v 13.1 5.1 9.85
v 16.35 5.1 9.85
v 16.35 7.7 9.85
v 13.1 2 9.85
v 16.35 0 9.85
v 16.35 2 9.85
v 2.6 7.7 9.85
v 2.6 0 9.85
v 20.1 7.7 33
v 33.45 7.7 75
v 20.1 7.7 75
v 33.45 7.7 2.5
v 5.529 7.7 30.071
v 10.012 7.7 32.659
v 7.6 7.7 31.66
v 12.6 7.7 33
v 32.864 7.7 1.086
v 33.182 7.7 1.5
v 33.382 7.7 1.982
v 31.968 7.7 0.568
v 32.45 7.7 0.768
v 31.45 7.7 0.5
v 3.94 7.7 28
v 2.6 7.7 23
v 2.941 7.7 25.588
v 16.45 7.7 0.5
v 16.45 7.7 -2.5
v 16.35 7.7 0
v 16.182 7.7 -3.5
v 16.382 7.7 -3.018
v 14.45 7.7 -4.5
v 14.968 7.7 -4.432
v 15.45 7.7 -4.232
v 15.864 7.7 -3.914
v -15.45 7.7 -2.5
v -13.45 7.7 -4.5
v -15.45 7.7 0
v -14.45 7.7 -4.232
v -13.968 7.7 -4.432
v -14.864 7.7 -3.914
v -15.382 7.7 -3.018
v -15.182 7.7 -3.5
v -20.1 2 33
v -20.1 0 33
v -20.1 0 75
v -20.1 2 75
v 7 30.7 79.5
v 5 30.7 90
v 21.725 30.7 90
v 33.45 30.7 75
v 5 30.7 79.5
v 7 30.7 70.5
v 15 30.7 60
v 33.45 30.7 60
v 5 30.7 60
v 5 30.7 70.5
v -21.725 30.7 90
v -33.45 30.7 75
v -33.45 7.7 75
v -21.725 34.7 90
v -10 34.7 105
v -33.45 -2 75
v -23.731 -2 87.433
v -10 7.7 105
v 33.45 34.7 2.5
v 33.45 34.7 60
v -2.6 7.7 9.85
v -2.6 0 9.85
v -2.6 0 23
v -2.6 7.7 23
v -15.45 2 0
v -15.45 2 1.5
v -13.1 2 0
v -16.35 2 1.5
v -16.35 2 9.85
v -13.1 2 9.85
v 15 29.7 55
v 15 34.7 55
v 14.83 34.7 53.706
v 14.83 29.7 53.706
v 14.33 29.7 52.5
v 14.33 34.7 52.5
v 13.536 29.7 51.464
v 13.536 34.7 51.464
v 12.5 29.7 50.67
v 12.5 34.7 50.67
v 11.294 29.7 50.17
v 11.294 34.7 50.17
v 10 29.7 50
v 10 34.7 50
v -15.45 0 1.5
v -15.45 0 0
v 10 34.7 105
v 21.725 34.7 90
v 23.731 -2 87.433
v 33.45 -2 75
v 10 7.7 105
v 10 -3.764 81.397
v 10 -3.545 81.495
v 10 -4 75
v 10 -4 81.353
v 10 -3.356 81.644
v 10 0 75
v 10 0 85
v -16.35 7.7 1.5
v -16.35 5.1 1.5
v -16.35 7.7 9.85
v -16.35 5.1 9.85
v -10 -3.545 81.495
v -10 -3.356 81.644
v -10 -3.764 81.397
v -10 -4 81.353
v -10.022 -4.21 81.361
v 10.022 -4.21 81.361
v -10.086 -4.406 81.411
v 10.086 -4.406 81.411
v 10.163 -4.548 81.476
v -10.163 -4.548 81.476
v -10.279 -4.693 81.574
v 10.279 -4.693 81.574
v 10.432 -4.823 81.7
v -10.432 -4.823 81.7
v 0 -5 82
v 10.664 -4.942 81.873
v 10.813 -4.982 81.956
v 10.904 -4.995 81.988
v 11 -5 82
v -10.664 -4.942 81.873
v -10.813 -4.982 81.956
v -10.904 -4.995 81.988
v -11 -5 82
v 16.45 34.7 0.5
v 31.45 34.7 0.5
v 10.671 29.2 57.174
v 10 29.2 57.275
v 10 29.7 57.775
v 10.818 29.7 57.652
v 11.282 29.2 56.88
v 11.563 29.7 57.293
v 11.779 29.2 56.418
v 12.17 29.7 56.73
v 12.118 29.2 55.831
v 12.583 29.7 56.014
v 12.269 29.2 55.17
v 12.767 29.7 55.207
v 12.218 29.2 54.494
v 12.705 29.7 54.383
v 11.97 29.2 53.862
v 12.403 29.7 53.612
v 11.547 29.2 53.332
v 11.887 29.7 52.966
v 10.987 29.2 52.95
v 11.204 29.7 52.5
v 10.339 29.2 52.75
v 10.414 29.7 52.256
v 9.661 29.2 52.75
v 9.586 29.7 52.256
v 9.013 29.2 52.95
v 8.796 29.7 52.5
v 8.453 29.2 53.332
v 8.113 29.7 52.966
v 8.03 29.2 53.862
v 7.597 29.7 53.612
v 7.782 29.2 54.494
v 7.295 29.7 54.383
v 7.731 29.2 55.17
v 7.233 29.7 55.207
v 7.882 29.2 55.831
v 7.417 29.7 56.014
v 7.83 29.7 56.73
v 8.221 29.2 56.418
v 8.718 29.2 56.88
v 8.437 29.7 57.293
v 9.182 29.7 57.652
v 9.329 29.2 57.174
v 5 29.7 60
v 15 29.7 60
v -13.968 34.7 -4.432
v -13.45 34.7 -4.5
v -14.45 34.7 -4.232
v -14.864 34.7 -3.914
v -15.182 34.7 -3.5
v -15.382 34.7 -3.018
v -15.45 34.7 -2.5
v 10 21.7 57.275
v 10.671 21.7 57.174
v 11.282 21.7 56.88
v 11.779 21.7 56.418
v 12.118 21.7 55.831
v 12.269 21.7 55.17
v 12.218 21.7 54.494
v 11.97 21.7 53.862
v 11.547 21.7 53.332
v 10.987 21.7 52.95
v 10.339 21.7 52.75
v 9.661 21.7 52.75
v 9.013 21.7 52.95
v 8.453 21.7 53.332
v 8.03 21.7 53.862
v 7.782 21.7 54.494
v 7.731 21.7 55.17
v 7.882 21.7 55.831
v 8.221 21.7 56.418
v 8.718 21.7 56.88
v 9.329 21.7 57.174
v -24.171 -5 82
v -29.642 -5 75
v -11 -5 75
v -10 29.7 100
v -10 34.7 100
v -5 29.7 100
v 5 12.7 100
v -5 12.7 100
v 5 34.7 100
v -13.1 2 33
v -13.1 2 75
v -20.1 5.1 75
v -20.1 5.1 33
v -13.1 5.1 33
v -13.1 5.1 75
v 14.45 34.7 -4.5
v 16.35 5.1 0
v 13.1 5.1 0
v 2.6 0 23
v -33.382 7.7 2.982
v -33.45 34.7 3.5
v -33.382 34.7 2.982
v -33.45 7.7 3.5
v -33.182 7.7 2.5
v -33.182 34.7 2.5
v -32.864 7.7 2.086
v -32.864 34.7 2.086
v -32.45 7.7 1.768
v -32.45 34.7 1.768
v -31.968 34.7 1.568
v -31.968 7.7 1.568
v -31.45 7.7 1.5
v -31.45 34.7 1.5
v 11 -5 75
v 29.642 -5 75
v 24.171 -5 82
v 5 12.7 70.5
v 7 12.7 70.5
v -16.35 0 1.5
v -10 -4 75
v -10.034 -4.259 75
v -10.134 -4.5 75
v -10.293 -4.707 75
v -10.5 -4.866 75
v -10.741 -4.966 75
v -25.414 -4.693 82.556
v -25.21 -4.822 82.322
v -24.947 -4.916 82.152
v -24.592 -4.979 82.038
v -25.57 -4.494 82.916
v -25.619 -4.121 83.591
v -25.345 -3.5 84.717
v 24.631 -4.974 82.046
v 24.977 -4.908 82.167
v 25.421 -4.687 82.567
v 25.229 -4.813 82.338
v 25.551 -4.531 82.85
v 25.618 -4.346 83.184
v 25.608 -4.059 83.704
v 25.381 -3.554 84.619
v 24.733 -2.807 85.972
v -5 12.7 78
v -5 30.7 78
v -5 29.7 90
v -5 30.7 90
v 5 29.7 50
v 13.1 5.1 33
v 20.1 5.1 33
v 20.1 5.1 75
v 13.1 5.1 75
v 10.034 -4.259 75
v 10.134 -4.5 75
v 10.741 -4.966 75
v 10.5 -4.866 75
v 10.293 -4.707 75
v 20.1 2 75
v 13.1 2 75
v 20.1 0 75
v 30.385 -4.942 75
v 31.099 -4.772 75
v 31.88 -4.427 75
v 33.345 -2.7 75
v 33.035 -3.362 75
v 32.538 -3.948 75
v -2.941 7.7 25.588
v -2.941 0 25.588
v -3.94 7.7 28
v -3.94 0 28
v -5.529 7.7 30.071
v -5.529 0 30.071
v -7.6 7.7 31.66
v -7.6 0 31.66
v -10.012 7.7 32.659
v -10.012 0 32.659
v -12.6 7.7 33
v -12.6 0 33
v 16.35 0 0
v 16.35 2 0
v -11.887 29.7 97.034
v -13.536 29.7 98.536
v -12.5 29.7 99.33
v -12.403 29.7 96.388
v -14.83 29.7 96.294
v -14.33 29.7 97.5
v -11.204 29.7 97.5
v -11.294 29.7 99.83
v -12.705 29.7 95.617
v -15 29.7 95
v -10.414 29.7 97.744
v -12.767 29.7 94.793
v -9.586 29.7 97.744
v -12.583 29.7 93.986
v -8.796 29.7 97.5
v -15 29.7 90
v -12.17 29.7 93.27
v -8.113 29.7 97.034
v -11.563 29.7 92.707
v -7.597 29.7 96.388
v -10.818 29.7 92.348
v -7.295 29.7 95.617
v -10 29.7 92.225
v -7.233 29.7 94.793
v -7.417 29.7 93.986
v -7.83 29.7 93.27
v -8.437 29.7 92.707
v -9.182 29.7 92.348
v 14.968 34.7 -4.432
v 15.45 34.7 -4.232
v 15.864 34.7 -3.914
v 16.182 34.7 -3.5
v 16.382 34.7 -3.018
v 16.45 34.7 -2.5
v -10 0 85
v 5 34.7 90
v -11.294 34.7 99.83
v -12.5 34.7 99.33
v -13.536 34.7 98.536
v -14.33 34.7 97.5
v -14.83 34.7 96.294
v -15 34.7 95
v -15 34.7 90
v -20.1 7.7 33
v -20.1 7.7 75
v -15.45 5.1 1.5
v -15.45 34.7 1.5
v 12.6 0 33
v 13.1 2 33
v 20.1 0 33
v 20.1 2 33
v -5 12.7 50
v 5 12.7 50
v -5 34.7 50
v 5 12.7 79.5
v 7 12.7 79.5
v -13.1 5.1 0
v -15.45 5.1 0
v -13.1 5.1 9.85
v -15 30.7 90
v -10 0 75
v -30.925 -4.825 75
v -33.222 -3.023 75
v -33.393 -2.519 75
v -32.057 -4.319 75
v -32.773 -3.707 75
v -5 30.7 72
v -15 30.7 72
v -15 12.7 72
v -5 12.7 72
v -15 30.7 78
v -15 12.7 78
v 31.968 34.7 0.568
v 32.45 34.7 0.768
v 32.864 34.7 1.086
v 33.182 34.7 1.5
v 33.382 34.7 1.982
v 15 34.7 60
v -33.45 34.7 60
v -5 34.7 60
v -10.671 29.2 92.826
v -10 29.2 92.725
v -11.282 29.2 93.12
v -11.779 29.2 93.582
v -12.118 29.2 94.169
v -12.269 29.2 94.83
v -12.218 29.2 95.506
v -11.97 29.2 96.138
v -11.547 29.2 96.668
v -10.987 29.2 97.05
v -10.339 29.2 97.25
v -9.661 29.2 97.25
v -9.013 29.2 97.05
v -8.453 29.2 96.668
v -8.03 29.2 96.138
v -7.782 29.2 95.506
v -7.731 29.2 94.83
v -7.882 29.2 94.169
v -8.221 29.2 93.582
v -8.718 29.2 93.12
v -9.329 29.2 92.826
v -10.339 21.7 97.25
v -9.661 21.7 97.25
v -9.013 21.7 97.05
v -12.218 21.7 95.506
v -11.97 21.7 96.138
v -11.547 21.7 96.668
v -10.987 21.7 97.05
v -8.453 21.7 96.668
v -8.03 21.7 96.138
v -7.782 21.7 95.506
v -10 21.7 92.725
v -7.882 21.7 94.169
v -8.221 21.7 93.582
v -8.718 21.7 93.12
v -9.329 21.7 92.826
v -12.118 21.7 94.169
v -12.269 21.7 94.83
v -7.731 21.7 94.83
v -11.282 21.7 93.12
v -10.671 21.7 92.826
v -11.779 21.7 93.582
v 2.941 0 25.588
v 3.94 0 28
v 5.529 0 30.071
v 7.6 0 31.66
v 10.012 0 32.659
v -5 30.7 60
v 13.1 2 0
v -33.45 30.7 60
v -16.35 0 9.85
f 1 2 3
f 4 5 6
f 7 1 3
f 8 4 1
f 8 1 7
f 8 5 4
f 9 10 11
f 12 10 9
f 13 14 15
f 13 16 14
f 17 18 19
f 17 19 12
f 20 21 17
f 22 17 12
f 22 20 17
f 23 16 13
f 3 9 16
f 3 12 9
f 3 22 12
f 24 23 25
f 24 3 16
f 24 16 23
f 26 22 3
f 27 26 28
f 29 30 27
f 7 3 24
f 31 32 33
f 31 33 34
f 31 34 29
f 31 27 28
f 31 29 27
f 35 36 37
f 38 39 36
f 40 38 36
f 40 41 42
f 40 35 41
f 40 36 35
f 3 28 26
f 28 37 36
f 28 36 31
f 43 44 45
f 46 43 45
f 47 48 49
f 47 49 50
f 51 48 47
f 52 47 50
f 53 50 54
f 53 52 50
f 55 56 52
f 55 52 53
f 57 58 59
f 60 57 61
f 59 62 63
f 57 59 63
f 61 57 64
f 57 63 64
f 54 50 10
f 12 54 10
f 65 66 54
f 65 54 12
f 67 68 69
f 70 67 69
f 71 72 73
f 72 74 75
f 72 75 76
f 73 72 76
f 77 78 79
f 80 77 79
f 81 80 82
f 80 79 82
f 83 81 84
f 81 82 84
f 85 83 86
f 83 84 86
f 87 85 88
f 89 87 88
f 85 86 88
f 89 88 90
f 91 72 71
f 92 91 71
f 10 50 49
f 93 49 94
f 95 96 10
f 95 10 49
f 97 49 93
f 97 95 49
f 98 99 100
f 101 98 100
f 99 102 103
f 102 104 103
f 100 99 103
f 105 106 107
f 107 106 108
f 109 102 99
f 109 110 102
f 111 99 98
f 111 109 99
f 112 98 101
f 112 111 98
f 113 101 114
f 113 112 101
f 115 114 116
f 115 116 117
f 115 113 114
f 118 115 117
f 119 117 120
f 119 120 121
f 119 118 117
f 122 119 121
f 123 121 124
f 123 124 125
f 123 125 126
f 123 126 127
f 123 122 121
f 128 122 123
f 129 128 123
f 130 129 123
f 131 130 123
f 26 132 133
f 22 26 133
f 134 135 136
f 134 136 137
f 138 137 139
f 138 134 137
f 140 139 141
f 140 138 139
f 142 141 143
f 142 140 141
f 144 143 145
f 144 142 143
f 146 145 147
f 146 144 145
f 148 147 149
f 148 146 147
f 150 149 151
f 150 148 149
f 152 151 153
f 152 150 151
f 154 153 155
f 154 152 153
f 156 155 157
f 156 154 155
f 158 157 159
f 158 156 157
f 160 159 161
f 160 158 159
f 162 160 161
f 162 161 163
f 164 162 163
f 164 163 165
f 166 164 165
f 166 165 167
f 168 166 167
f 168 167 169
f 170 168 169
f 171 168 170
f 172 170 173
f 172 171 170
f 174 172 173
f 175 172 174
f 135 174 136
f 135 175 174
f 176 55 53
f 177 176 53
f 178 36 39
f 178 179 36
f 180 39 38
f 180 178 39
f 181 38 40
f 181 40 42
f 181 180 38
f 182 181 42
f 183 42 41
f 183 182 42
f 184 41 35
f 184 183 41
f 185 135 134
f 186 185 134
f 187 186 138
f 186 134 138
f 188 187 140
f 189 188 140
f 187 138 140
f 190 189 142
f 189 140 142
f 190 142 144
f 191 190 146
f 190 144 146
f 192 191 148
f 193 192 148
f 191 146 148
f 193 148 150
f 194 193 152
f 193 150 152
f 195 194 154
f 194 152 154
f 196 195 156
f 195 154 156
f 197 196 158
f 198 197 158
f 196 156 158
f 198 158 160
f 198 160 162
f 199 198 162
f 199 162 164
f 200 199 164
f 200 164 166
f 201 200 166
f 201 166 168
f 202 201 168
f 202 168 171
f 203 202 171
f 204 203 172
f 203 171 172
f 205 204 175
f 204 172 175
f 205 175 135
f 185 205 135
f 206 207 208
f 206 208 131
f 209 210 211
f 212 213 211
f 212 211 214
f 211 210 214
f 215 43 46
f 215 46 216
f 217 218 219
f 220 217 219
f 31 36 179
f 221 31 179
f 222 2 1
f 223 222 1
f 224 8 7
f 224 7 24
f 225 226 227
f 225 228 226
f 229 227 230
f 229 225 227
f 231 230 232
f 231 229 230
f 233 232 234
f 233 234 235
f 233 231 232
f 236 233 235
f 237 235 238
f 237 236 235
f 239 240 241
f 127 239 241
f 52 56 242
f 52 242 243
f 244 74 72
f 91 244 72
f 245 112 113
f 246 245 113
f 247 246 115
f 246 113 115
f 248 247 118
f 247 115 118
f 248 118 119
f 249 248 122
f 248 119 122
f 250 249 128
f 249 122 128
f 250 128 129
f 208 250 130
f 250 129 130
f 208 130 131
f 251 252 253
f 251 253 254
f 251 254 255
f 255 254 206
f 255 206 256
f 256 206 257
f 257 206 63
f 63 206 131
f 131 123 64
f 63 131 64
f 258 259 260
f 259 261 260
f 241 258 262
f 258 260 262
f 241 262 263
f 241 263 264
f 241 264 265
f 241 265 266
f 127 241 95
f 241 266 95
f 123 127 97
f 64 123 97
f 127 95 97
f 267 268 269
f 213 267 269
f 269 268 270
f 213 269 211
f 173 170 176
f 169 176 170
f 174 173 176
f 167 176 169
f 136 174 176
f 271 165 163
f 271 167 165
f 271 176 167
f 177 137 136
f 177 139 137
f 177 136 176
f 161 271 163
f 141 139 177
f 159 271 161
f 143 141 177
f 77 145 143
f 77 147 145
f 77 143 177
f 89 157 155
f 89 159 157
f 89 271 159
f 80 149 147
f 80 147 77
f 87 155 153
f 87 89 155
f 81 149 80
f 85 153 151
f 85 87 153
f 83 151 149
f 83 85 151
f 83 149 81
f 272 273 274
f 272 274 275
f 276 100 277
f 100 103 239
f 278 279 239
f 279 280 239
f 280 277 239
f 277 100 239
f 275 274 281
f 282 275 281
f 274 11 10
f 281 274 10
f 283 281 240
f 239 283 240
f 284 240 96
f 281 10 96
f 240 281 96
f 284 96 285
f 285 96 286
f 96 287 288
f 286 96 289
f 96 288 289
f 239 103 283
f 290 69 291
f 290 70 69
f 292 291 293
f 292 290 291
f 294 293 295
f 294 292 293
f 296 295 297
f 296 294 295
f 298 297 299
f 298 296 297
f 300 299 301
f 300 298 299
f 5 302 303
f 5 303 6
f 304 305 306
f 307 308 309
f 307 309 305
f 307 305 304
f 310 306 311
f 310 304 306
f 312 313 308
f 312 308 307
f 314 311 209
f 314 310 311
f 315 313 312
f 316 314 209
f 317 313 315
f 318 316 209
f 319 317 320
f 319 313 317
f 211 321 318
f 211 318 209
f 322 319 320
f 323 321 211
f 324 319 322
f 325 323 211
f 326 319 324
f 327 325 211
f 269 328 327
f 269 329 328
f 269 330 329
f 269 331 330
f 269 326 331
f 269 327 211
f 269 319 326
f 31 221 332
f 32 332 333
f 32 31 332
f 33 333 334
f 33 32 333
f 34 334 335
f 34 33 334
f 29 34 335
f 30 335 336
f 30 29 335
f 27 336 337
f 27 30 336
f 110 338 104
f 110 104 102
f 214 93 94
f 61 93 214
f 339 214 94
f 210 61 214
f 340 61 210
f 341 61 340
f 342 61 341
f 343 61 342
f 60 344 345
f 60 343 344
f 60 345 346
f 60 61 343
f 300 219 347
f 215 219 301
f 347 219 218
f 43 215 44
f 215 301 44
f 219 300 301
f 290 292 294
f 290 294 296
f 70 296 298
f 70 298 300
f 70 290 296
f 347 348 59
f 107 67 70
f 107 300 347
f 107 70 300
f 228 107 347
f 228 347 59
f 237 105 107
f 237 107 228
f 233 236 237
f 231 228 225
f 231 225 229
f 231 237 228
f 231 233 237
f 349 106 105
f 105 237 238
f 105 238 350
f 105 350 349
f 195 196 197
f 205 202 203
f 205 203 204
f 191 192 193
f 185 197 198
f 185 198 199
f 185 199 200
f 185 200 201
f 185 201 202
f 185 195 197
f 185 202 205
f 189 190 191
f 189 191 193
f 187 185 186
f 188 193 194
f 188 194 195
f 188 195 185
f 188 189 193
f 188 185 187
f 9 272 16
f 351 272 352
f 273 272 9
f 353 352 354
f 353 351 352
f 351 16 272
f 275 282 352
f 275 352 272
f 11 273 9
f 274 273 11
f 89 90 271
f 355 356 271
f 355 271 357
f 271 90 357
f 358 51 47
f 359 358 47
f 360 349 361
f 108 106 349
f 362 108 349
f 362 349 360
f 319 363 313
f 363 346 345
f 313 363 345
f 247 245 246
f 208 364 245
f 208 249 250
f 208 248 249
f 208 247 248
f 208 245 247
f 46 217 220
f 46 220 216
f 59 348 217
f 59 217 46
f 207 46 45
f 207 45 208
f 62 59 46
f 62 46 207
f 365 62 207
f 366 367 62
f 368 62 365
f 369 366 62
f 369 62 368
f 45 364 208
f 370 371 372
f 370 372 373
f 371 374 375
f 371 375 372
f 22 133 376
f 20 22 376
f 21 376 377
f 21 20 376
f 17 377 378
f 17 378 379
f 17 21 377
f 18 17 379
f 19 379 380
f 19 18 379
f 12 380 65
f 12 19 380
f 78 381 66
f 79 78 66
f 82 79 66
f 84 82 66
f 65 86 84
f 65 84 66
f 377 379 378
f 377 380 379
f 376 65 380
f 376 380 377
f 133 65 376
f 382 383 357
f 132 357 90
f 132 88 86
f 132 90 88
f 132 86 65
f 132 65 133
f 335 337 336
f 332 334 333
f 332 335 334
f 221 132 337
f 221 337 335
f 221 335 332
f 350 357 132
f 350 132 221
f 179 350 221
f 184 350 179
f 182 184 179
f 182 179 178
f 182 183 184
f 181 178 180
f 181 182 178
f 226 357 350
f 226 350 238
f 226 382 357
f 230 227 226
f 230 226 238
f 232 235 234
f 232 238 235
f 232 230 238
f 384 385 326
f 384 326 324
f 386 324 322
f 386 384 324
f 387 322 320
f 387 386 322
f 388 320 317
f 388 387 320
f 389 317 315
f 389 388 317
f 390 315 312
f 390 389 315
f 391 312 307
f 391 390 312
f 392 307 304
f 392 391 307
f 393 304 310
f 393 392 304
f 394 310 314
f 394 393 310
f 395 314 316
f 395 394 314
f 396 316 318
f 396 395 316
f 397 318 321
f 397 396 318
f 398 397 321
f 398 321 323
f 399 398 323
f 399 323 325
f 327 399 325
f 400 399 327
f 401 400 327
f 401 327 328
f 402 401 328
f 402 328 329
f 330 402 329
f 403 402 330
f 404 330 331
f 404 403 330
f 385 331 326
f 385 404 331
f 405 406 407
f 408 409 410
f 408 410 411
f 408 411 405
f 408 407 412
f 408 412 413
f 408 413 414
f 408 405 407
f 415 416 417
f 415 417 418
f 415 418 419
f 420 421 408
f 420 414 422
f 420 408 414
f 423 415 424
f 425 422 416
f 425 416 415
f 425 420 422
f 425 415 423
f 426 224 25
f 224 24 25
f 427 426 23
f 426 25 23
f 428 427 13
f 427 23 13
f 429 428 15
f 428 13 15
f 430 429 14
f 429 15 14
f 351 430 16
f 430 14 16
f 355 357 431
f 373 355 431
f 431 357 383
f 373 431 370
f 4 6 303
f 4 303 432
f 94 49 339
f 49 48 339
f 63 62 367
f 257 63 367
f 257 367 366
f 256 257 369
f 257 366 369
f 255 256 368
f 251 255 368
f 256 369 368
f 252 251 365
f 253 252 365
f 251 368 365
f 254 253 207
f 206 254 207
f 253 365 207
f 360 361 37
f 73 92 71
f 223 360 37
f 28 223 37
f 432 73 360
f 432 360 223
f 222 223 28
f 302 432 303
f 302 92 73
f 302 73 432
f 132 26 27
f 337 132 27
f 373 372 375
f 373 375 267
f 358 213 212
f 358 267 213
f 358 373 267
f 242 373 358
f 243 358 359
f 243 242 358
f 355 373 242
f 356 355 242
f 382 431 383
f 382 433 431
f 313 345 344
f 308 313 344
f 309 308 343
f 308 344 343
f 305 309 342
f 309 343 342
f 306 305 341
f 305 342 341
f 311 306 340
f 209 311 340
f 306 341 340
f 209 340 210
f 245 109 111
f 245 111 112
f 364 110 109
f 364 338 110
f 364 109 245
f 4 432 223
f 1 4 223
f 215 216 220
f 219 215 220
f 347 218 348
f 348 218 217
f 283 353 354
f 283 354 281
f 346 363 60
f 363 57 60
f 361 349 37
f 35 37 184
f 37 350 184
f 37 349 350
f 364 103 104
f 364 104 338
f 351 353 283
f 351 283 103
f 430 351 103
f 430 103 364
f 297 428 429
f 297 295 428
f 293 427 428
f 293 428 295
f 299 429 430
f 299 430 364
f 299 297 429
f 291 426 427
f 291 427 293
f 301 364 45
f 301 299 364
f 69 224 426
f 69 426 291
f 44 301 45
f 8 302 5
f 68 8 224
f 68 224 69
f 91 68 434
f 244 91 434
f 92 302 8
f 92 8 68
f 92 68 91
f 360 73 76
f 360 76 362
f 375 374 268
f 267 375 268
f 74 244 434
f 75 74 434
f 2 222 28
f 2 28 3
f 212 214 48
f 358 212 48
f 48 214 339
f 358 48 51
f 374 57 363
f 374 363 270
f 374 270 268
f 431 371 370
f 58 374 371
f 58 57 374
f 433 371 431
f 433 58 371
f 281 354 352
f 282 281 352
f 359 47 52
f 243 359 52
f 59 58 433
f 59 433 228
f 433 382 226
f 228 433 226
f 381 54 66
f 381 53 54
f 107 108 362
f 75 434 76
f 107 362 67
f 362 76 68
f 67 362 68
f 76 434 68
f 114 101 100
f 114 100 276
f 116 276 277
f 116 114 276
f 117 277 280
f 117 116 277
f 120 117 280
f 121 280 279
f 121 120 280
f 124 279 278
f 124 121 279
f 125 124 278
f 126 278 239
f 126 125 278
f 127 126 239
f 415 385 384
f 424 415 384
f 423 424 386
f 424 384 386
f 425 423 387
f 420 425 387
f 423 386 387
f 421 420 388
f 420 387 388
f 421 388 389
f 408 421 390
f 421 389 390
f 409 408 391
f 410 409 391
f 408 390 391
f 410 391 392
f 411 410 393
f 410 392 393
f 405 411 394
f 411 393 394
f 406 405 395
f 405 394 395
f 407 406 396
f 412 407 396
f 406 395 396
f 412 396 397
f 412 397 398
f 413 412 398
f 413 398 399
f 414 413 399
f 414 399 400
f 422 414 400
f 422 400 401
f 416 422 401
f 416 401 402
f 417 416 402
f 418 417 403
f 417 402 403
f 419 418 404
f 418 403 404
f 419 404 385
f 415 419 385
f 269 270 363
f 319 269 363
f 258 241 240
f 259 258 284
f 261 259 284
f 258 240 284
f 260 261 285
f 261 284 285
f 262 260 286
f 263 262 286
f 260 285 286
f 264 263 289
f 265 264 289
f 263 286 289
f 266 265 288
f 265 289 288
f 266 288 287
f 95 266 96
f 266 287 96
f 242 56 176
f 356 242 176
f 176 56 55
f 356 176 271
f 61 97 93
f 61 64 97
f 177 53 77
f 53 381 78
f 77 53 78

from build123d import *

# Parameters (mm, degrees)
BOSS_EXTRUDE1_DEPTH     = 7.7
SKETCH2_W               = 7
SKETCH2_H               = 3.1
CUT_EXTRUDE1_DEPTH      = 79.027559234
FILLET1_R               = 10
BOSS_EXTRUDE2_DEPTH     = 2
SKETCH4_W               = 109.5
SKETCH4_H               = 25
BOSS_EXTRUDE3_DEPTH     = 33.45
BOSS_EXTRUDE4_REACH     = 117.534
CUT_EXTRUDE2_DEPTH      = 114.458814113
CUT_EXTRUDE2_DEPTH_BACK = 114.458814113
CUT_EXTRUDE3_DEPTH      = 10
FILLET3_R               = 1
CUT_EXTRUDE5_REACH      = 117.534
SKETCH9_W               = 30
SKETCH9_H               = 4
FILLET5_R               = 3
CUT_EXTRUDE4_REACH      = 119.132
SKETCH8_W               = 17
SKETCH8_H               = 5
SKETCH8_W_2             = 19
SKETCH8_H_2             = 7
FILLET6_R               = 2
FILLET7_R               = 2
SKETCH11_W              = 10
SKETCH11_H              = 10
CUT_EXTRUDE6_DEPTH      = 22
CUT_EXTRUDE9_DEPTH      = 5
SKETCH12_R              = 2.275
CUT_EXTRUDE7_DEPTH      = 8
CHAMFER1_SIZE           = 0.5
SKETCH13_W              = 2
SKETCH13_H              = 9
SKETCH13_W_2            = 10
SKETCH13_H_2            = 6
CUT_EXTRUDE10_DEPTH     = 18


with BuildPart() as part:
    # Sketch1 → Boss-Extrude1 (new body)
    with BuildSketch(Plane(origin=(0, 0, 0), x_dir=(1, 0, 0), z_dir=(0, 1, 0))):
        Polygon((0, 0), (-16.35, 0), (-16.35, -9.85), (-2.6, -9.85), (-2.6, -33), (-20.1, -33), (-20.1, -75), (0, -75), align=None)
    extrude(amount=BOSS_EXTRUDE1_DEPTH)

    # Sketch2 → Cut-Extrude1 (cut, through all)
    with BuildSketch(Plane.XY.offset(75)):
        with Locations((-16.6, 3.55)):
            Rectangle(SKETCH2_W, SKETCH2_H)
    extrude(amount=-CUT_EXTRUDE1_DEPTH, mode=Mode.SUBTRACT)

    # Fillet1
    fillet1_edges = [part.edges().sort_by_distance(p)[0] for p in [
        (-2.6, 3.85, 33),
    ]]
    fillet(fillet1_edges, radius=FILLET1_R)

    # Sketch3 → Boss-Extrude2 (add)
    with BuildSketch(Plane(origin=(0, 7.7, 0), x_dir=(1, 0, 0), z_dir=(0, 1, 0))):
        Polygon((0, 4.5), (-33.45, 4.5), (-33.45, -75), (-10, -105), (0, -105), align=None)
    extrude(amount=BOSS_EXTRUDE2_DEPTH)

    # Sketch4 → Boss-Extrude3 (add)
    with BuildSketch(Plane(origin=(0, 0, 0), x_dir=(0, 0, -1), z_dir=(1, 0, 0))):
        with Locations((-50.25, 22.2)):
            Rectangle(SKETCH4_W, SKETCH4_H)
    extrude(amount=-BOSS_EXTRUDE3_DEPTH)

    # Boss-Extrude4: up to this face of the body (flat: up to its plane)
    boss_extrude4_end = Plane(part.part.faces().sort_by_distance((0, 18.36479202, 48.166489813))[0])
    # Sketch5 → Boss-Extrude4 (add, up to the picked face)
    with BuildSketch(Plane.ZY.offset(33.45), mode=Mode.PRIVATE) as boss_extrude4_sk1:
        Polygon((75, 7.7), (75, -5), (82, -5), (105, 7.7), align=None)
    boss_extrude4_tool1 = split(extrude(boss_extrude4_sk1.sketch, amount=-BOSS_EXTRUDE4_REACH, mode=Mode.PRIVATE), bisect_by=boss_extrude4_end, keep=Keep.BOTH, mode=Mode.PRIVATE)
    add(boss_extrude4_tool1.solids().sort_by(Axis((-33.45, 2.665766, 85.441441), (1, 0, 0)))[0])

    # Sketch6 → Cut-Extrude2 (cut, two sides: drawn at the far end of the back side and taken through both)
    with BuildSketch(Plane(origin=(0, 7.7, 0), x_dir=(1, 0, 0), z_dir=(0, 1, 0)).offset(-CUT_EXTRUDE2_DEPTH_BACK)):
        Polygon((-33.45, -75), (-10, -105), (-33.45, -105), align=None)
    extrude(amount=CUT_EXTRUDE2_DEPTH + CUT_EXTRUDE2_DEPTH_BACK, mode=Mode.SUBTRACT)

    # Sketch7 → Cut-Extrude3 (cut)
    with BuildSketch(Plane(origin=(0, 0, 0), x_dir=(0, 0, -1), z_dir=(1, 0, 0))):
        Polygon((-75, 0), (-85, 0), (-80, -5), (-75, -5), align=None)
    extrude(amount=-CUT_EXTRUDE3_DEPTH, mode=Mode.SUBTRACT)

    # Fillet3
    # the kernel refuses this fillet: 1 mm, written as the material it takes off along each edge
    with BuildSketch(Plane(origin=(5.810983209, -5, 80), x_dir=(0, 0.707106781186549, 0.7071067811865459), z_dir=(-1, 0, 0))) as fillet3_piece_1:
        with BuildLine():
            CenterArc((2.324393283, -1), FILLET3_R, 90, 114.469800521)
            Line((1.414213562, -1.414213562), (1.396009968, -1.422497834))
            ThreePointArc((1.396009968, -1.422497834), (0.692964646, -0.721248917), (-0.014142136, -0.014142136))
            Line((-0.014142136, -0.014142136), (0, 0.02))
            Line((0, 0.02), (2.324393283, 0.02))
            Line((2.324393283, 0.02), (2.324393283, 0))
        make_face()
    extrude(amount=15.810983209, mode=Mode.SUBTRACT)
    with BuildSketch(Plane(origin=(-10, -5, 82.5), x_dir=(0, 1, 0), z_dir=(0, 0, -1))) as fillet3_piece_2_section:
        with BuildLine():
            CenterArc((FILLET3_R, -FILLET3_R), FILLET3_R, 90, 90)
            Line((0, -FILLET3_R), (-FILLET3_R * 0.02, -FILLET3_R))
            Line((-FILLET3_R * 0.02, -FILLET3_R), (-FILLET3_R * 0.02, FILLET3_R * 0.02))
            Line((-FILLET3_R * 0.02, FILLET3_R * 0.02), (FILLET3_R, FILLET3_R * 0.02))
            Line((FILLET3_R, FILLET3_R * 0.02), (FILLET3_R, 0))
        make_face()
    fillet3_piece_2 = extrude(amount=10, mode=Mode.PRIVATE)
    fillet3_piece_2 = split(fillet3_piece_2, bisect_by=Plane(origin=(-10.222841489, -6.700692184, 78.299307816), z_dir=(0, 0.7071067811865466, -0.7071067811865485)), keep=Keep.TOP, mode=Mode.PRIVATE)
    add(fillet3_piece_2, mode=Mode.SUBTRACT)
    with BuildSketch(Plane(origin=(5.810983209, -5, 80), x_dir=(0, 0.707106781186549, 0.7071067811865459), z_dir=(-1, 0, 0))) as fillet3_piece_3a_section:
        with BuildLine():
            CenterArc((2.324393283, -1), FILLET3_R, 90, 114.469800521)
            Line((1.414213562, -1.414213562), (1.396009968, -1.422497834))
            ThreePointArc((1.396009968, -1.422497834), (0.692964646, -0.721248917), (-0.014142136, -0.014142136))
            Line((-0.014142136, -0.014142136), (0, 0.02))
            Line((0, 0.02), (2.324393283, 0.02))
            Line((2.324393283, 0.02), (2.324393283, 0))
        make_face()
    fillet3_piece_3a = extrude(amount=21.621966417, mode=Mode.PRIVATE)
    fillet3_piece_3a = split(fillet3_piece_3a, bisect_by=Plane(origin=(-10, -4.567151235, 80.996776665), z_dir=(-1, 0, 0)), keep=Keep.TOP, mode=Mode.PRIVATE)
    with BuildSketch(Plane(origin=(-10, -5, 82.5), x_dir=(0, 1, 0), z_dir=(0, 0, -1))) as fillet3_piece_3b_section:
        with BuildLine():
            CenterArc((FILLET3_R, -FILLET3_R), FILLET3_R, 90, 90)
            Line((0, -FILLET3_R), (-FILLET3_R * 0.02, -FILLET3_R))
            Line((-FILLET3_R * 0.02, -FILLET3_R), (-FILLET3_R * 0.02, FILLET3_R * 0.02))
            Line((-FILLET3_R * 0.02, FILLET3_R * 0.02), (FILLET3_R, FILLET3_R * 0.02))
            Line((FILLET3_R, FILLET3_R * 0.02), (FILLET3_R, 0))
        make_face()
    fillet3_piece_3b = extrude(amount=10, mode=Mode.PRIVATE)
    fillet3_piece_3b = split(fillet3_piece_3b, bisect_by=Plane(origin=(-10.238471404, -4.220535034, 80.779464966), z_dir=(0, -0.7071067811865466, 0.7071067811865485)), keep=Keep.TOP, mode=Mode.PRIVATE)
    fillet3_piece_3 = fillet3_piece_3a & fillet3_piece_3b
    add(fillet3_piece_3, mode=Mode.SUBTRACT)

    # Sketch9 → Cut-Extrude5 (cut, up to next)
    with BuildSketch(Plane(origin=(0, 0, 0), x_dir=(0, 0, -1), z_dir=(1, 0, 0)), mode=Mode.PRIVATE) as cut_extrude5_sk1:
        with Locations((-75, 32.7)):
            Rectangle(SKETCH9_W, SKETCH9_H)
    cut_extrude5_tool1 = extrude(cut_extrude5_sk1.sketch, amount=-CUT_EXTRUDE5_REACH, mode=Mode.PRIVATE) & part.part
    add(cut_extrude5_tool1.solids().sort_by_distance((0, 32.7, 75))[0], mode=Mode.SUBTRACT)

    # Mirror1: part across plane


with BuildPart() as part_1:
    add(part.part)
    add(part.part.mirror(Plane(origin=(0, 7.7, 75), x_dir=(0, 0, 1), z_dir=(-1, 0, 0))))

    # Fillet5
    # the kernel refuses this fillet: 3 mm, written as the material it takes off along each edge
    with BuildSketch(Plane(origin=(-38.068859068, -5, 69.091011854), x_dir=(0, 1, 0), z_dir=(0.6158478756904763, 0, 0.7878650861711843)), Plane(origin=(38.068859068, -5, 69.091011854), x_dir=(-0.7878650861711843, 0, -0.6158478756904764), z_dir=(-0.6158478756904763, 0, 0.7878650861711843))) as fillet5_piece_1:
        with BuildLine():
            CenterArc((FILLET5_R, -FILLET5_R), FILLET5_R, 90, 90)
            Line((0, -FILLET5_R), (0, 0))
            Line((0, 0), (FILLET5_R, 0))
        make_face()
    extrude(amount=23.884769896, mode=Mode.SUBTRACT)

    # Cut-Extrude4: up to this face of the body (flat: up to its plane)
    cut_extrude4_end = Plane(part_1.part.faces().sort_by_distance((0, 0, 47.459676899))[0])
    # Sketch8 → Cut-Extrude4 (cut, up to the picked face)
    with BuildSketch(Plane(origin=(0, 34.7, 0), x_dir=(1, 0, 0), z_dir=(0, 1, 0)), mode=Mode.PRIVATE) as cut_extrude4_sk1:
        with Locations((24.95, 2)):
            Rectangle(SKETCH8_W, SKETCH8_H)
    cut_extrude4_tool1 = split(extrude(cut_extrude4_sk1.sketch, amount=-CUT_EXTRUDE4_REACH, mode=Mode.PRIVATE), bisect_by=cut_extrude4_end, keep=Keep.BOTH, mode=Mode.PRIVATE)
    # Sketch8 → Cut-Extrude4 (cut, up to the picked face)
    with BuildSketch(Plane(origin=(0, 34.7, 0), x_dir=(1, 0, 0), z_dir=(0, 1, 0)), mode=Mode.PRIVATE) as cut_extrude4_sk2:
        with Locations((-24.95, 2)):
            Rectangle(SKETCH8_W_2, SKETCH8_H_2)
    cut_extrude4_tool2 = split(extrude(cut_extrude4_sk2.sketch, amount=-CUT_EXTRUDE4_REACH, mode=Mode.PRIVATE), bisect_by=cut_extrude4_end, keep=Keep.BOTH, mode=Mode.PRIVATE)
    add(cut_extrude4_tool1.solids().sort_by(Axis((24.95, 34.7, -2), (0, -1, 0)))[0], mode=Mode.SUBTRACT)
    add(cut_extrude4_tool2.solids().sort_by(Axis((-24.95, 34.7, -2), (0, -1, 0)))[0], mode=Mode.SUBTRACT)

    # Fillet6
    fillet6_edges = [part_1.edges().sort_by_distance(p)[0] for p in [
        (-15.45, 21.2, -4.5),
        (-33.45, 21.2, 1.5),
    ]]
    fillet(fillet6_edges, radius=FILLET6_R)

    # Fillet7
    fillet7_edges = [part_1.edges().sort_by_distance(p)[0] for p in [
        (33.45, 21.2, 0.5),
        (16.45, 21.2, -4.5),
    ]]
    fillet(fillet7_edges, radius=FILLET7_R)

    # Sketch11 → Cut-Extrude6 (cut)
    with BuildSketch(Plane(origin=(0, 34.7, 0), x_dir=(1, 0, 0), z_dir=(0, 1, 0))):
        Polygon((-5, -90), (-5, -100), (5, -100), (5, -60), (-5, -60), align=None)
        with Locations((0, -55)):
            Rectangle(SKETCH11_W, SKETCH11_H)
    extrude(amount=-CUT_EXTRUDE6_DEPTH, mode=Mode.SUBTRACT)

    # Sketch11<3> → Cut-Extrude9 (cut)
    with BuildSketch(Plane(origin=(0, 34.7, 0), x_dir=(1, 0, 0), z_dir=(0, 1, 0))):
        Polygon((-5, -90), (-5, -100), (5, -100), (5, -60), (5, -50), (-5, -50), align=None)
        with BuildLine():
            Line((-10, -100), (-5, -100))
            Line((-5, -100), (-5, -90))
            Line((-5, -90), (-15, -90))
            Line((-15, -90), (-15, -95))
            ThreePointArc((-15, -95), (-13.535533906, -98.535533906), (-10, -100))
        make_face()
        with BuildLine():
            Line((5, -50), (5, -60))
            Line((5, -60), (15, -60))
            Line((15, -60), (15, -55))
            ThreePointArc((15, -55), (13.535533906, -51.464466094), (10, -50))
            Line((10, -50), (5, -50))
        make_face()
    extrude(amount=-CUT_EXTRUDE9_DEPTH, mode=Mode.SUBTRACT)

    # Sketch12 → Cut-Extrude7 (cut)
    with BuildSketch(Plane(origin=(0, 29.7, 0), x_dir=(1, 0, 0), z_dir=(0, 1, 0))):
        with Locations(Location((10, -55, 0), (0, 0, 270))):
            Circle(SKETCH12_R)
        with Locations(Location((-10, -95, 0), (0, 0, 90))):
            Circle(SKETCH12_R)
    extrude(amount=-CUT_EXTRUDE7_DEPTH, mode=Mode.SUBTRACT)

    # Chamfer1
    chamfer1_edges = [part_1.edges().sort_by_distance(p)[0] for p in [
        (10, 29.7, 52.725),
        (-10, 29.7, 97.275),
    ]]
    chamfer(chamfer1_edges, length=CHAMFER1_SIZE)

    # Sketch13 → Cut-Extrude10 (cut)
    with BuildSketch(Plane(origin=(0, 30.7, 0), x_dir=(1, 0, 0), z_dir=(0, 1, 0))):
        with Locations((6, -75)):
            Rectangle(SKETCH13_W, SKETCH13_H)
        with Locations((-10, -75)):
            Rectangle(SKETCH13_W_2, SKETCH13_H_2)
    extrude(amount=-CUT_EXTRUDE10_DEPTH, mode=Mode.SUBTRACT)


solid = part_1.part
